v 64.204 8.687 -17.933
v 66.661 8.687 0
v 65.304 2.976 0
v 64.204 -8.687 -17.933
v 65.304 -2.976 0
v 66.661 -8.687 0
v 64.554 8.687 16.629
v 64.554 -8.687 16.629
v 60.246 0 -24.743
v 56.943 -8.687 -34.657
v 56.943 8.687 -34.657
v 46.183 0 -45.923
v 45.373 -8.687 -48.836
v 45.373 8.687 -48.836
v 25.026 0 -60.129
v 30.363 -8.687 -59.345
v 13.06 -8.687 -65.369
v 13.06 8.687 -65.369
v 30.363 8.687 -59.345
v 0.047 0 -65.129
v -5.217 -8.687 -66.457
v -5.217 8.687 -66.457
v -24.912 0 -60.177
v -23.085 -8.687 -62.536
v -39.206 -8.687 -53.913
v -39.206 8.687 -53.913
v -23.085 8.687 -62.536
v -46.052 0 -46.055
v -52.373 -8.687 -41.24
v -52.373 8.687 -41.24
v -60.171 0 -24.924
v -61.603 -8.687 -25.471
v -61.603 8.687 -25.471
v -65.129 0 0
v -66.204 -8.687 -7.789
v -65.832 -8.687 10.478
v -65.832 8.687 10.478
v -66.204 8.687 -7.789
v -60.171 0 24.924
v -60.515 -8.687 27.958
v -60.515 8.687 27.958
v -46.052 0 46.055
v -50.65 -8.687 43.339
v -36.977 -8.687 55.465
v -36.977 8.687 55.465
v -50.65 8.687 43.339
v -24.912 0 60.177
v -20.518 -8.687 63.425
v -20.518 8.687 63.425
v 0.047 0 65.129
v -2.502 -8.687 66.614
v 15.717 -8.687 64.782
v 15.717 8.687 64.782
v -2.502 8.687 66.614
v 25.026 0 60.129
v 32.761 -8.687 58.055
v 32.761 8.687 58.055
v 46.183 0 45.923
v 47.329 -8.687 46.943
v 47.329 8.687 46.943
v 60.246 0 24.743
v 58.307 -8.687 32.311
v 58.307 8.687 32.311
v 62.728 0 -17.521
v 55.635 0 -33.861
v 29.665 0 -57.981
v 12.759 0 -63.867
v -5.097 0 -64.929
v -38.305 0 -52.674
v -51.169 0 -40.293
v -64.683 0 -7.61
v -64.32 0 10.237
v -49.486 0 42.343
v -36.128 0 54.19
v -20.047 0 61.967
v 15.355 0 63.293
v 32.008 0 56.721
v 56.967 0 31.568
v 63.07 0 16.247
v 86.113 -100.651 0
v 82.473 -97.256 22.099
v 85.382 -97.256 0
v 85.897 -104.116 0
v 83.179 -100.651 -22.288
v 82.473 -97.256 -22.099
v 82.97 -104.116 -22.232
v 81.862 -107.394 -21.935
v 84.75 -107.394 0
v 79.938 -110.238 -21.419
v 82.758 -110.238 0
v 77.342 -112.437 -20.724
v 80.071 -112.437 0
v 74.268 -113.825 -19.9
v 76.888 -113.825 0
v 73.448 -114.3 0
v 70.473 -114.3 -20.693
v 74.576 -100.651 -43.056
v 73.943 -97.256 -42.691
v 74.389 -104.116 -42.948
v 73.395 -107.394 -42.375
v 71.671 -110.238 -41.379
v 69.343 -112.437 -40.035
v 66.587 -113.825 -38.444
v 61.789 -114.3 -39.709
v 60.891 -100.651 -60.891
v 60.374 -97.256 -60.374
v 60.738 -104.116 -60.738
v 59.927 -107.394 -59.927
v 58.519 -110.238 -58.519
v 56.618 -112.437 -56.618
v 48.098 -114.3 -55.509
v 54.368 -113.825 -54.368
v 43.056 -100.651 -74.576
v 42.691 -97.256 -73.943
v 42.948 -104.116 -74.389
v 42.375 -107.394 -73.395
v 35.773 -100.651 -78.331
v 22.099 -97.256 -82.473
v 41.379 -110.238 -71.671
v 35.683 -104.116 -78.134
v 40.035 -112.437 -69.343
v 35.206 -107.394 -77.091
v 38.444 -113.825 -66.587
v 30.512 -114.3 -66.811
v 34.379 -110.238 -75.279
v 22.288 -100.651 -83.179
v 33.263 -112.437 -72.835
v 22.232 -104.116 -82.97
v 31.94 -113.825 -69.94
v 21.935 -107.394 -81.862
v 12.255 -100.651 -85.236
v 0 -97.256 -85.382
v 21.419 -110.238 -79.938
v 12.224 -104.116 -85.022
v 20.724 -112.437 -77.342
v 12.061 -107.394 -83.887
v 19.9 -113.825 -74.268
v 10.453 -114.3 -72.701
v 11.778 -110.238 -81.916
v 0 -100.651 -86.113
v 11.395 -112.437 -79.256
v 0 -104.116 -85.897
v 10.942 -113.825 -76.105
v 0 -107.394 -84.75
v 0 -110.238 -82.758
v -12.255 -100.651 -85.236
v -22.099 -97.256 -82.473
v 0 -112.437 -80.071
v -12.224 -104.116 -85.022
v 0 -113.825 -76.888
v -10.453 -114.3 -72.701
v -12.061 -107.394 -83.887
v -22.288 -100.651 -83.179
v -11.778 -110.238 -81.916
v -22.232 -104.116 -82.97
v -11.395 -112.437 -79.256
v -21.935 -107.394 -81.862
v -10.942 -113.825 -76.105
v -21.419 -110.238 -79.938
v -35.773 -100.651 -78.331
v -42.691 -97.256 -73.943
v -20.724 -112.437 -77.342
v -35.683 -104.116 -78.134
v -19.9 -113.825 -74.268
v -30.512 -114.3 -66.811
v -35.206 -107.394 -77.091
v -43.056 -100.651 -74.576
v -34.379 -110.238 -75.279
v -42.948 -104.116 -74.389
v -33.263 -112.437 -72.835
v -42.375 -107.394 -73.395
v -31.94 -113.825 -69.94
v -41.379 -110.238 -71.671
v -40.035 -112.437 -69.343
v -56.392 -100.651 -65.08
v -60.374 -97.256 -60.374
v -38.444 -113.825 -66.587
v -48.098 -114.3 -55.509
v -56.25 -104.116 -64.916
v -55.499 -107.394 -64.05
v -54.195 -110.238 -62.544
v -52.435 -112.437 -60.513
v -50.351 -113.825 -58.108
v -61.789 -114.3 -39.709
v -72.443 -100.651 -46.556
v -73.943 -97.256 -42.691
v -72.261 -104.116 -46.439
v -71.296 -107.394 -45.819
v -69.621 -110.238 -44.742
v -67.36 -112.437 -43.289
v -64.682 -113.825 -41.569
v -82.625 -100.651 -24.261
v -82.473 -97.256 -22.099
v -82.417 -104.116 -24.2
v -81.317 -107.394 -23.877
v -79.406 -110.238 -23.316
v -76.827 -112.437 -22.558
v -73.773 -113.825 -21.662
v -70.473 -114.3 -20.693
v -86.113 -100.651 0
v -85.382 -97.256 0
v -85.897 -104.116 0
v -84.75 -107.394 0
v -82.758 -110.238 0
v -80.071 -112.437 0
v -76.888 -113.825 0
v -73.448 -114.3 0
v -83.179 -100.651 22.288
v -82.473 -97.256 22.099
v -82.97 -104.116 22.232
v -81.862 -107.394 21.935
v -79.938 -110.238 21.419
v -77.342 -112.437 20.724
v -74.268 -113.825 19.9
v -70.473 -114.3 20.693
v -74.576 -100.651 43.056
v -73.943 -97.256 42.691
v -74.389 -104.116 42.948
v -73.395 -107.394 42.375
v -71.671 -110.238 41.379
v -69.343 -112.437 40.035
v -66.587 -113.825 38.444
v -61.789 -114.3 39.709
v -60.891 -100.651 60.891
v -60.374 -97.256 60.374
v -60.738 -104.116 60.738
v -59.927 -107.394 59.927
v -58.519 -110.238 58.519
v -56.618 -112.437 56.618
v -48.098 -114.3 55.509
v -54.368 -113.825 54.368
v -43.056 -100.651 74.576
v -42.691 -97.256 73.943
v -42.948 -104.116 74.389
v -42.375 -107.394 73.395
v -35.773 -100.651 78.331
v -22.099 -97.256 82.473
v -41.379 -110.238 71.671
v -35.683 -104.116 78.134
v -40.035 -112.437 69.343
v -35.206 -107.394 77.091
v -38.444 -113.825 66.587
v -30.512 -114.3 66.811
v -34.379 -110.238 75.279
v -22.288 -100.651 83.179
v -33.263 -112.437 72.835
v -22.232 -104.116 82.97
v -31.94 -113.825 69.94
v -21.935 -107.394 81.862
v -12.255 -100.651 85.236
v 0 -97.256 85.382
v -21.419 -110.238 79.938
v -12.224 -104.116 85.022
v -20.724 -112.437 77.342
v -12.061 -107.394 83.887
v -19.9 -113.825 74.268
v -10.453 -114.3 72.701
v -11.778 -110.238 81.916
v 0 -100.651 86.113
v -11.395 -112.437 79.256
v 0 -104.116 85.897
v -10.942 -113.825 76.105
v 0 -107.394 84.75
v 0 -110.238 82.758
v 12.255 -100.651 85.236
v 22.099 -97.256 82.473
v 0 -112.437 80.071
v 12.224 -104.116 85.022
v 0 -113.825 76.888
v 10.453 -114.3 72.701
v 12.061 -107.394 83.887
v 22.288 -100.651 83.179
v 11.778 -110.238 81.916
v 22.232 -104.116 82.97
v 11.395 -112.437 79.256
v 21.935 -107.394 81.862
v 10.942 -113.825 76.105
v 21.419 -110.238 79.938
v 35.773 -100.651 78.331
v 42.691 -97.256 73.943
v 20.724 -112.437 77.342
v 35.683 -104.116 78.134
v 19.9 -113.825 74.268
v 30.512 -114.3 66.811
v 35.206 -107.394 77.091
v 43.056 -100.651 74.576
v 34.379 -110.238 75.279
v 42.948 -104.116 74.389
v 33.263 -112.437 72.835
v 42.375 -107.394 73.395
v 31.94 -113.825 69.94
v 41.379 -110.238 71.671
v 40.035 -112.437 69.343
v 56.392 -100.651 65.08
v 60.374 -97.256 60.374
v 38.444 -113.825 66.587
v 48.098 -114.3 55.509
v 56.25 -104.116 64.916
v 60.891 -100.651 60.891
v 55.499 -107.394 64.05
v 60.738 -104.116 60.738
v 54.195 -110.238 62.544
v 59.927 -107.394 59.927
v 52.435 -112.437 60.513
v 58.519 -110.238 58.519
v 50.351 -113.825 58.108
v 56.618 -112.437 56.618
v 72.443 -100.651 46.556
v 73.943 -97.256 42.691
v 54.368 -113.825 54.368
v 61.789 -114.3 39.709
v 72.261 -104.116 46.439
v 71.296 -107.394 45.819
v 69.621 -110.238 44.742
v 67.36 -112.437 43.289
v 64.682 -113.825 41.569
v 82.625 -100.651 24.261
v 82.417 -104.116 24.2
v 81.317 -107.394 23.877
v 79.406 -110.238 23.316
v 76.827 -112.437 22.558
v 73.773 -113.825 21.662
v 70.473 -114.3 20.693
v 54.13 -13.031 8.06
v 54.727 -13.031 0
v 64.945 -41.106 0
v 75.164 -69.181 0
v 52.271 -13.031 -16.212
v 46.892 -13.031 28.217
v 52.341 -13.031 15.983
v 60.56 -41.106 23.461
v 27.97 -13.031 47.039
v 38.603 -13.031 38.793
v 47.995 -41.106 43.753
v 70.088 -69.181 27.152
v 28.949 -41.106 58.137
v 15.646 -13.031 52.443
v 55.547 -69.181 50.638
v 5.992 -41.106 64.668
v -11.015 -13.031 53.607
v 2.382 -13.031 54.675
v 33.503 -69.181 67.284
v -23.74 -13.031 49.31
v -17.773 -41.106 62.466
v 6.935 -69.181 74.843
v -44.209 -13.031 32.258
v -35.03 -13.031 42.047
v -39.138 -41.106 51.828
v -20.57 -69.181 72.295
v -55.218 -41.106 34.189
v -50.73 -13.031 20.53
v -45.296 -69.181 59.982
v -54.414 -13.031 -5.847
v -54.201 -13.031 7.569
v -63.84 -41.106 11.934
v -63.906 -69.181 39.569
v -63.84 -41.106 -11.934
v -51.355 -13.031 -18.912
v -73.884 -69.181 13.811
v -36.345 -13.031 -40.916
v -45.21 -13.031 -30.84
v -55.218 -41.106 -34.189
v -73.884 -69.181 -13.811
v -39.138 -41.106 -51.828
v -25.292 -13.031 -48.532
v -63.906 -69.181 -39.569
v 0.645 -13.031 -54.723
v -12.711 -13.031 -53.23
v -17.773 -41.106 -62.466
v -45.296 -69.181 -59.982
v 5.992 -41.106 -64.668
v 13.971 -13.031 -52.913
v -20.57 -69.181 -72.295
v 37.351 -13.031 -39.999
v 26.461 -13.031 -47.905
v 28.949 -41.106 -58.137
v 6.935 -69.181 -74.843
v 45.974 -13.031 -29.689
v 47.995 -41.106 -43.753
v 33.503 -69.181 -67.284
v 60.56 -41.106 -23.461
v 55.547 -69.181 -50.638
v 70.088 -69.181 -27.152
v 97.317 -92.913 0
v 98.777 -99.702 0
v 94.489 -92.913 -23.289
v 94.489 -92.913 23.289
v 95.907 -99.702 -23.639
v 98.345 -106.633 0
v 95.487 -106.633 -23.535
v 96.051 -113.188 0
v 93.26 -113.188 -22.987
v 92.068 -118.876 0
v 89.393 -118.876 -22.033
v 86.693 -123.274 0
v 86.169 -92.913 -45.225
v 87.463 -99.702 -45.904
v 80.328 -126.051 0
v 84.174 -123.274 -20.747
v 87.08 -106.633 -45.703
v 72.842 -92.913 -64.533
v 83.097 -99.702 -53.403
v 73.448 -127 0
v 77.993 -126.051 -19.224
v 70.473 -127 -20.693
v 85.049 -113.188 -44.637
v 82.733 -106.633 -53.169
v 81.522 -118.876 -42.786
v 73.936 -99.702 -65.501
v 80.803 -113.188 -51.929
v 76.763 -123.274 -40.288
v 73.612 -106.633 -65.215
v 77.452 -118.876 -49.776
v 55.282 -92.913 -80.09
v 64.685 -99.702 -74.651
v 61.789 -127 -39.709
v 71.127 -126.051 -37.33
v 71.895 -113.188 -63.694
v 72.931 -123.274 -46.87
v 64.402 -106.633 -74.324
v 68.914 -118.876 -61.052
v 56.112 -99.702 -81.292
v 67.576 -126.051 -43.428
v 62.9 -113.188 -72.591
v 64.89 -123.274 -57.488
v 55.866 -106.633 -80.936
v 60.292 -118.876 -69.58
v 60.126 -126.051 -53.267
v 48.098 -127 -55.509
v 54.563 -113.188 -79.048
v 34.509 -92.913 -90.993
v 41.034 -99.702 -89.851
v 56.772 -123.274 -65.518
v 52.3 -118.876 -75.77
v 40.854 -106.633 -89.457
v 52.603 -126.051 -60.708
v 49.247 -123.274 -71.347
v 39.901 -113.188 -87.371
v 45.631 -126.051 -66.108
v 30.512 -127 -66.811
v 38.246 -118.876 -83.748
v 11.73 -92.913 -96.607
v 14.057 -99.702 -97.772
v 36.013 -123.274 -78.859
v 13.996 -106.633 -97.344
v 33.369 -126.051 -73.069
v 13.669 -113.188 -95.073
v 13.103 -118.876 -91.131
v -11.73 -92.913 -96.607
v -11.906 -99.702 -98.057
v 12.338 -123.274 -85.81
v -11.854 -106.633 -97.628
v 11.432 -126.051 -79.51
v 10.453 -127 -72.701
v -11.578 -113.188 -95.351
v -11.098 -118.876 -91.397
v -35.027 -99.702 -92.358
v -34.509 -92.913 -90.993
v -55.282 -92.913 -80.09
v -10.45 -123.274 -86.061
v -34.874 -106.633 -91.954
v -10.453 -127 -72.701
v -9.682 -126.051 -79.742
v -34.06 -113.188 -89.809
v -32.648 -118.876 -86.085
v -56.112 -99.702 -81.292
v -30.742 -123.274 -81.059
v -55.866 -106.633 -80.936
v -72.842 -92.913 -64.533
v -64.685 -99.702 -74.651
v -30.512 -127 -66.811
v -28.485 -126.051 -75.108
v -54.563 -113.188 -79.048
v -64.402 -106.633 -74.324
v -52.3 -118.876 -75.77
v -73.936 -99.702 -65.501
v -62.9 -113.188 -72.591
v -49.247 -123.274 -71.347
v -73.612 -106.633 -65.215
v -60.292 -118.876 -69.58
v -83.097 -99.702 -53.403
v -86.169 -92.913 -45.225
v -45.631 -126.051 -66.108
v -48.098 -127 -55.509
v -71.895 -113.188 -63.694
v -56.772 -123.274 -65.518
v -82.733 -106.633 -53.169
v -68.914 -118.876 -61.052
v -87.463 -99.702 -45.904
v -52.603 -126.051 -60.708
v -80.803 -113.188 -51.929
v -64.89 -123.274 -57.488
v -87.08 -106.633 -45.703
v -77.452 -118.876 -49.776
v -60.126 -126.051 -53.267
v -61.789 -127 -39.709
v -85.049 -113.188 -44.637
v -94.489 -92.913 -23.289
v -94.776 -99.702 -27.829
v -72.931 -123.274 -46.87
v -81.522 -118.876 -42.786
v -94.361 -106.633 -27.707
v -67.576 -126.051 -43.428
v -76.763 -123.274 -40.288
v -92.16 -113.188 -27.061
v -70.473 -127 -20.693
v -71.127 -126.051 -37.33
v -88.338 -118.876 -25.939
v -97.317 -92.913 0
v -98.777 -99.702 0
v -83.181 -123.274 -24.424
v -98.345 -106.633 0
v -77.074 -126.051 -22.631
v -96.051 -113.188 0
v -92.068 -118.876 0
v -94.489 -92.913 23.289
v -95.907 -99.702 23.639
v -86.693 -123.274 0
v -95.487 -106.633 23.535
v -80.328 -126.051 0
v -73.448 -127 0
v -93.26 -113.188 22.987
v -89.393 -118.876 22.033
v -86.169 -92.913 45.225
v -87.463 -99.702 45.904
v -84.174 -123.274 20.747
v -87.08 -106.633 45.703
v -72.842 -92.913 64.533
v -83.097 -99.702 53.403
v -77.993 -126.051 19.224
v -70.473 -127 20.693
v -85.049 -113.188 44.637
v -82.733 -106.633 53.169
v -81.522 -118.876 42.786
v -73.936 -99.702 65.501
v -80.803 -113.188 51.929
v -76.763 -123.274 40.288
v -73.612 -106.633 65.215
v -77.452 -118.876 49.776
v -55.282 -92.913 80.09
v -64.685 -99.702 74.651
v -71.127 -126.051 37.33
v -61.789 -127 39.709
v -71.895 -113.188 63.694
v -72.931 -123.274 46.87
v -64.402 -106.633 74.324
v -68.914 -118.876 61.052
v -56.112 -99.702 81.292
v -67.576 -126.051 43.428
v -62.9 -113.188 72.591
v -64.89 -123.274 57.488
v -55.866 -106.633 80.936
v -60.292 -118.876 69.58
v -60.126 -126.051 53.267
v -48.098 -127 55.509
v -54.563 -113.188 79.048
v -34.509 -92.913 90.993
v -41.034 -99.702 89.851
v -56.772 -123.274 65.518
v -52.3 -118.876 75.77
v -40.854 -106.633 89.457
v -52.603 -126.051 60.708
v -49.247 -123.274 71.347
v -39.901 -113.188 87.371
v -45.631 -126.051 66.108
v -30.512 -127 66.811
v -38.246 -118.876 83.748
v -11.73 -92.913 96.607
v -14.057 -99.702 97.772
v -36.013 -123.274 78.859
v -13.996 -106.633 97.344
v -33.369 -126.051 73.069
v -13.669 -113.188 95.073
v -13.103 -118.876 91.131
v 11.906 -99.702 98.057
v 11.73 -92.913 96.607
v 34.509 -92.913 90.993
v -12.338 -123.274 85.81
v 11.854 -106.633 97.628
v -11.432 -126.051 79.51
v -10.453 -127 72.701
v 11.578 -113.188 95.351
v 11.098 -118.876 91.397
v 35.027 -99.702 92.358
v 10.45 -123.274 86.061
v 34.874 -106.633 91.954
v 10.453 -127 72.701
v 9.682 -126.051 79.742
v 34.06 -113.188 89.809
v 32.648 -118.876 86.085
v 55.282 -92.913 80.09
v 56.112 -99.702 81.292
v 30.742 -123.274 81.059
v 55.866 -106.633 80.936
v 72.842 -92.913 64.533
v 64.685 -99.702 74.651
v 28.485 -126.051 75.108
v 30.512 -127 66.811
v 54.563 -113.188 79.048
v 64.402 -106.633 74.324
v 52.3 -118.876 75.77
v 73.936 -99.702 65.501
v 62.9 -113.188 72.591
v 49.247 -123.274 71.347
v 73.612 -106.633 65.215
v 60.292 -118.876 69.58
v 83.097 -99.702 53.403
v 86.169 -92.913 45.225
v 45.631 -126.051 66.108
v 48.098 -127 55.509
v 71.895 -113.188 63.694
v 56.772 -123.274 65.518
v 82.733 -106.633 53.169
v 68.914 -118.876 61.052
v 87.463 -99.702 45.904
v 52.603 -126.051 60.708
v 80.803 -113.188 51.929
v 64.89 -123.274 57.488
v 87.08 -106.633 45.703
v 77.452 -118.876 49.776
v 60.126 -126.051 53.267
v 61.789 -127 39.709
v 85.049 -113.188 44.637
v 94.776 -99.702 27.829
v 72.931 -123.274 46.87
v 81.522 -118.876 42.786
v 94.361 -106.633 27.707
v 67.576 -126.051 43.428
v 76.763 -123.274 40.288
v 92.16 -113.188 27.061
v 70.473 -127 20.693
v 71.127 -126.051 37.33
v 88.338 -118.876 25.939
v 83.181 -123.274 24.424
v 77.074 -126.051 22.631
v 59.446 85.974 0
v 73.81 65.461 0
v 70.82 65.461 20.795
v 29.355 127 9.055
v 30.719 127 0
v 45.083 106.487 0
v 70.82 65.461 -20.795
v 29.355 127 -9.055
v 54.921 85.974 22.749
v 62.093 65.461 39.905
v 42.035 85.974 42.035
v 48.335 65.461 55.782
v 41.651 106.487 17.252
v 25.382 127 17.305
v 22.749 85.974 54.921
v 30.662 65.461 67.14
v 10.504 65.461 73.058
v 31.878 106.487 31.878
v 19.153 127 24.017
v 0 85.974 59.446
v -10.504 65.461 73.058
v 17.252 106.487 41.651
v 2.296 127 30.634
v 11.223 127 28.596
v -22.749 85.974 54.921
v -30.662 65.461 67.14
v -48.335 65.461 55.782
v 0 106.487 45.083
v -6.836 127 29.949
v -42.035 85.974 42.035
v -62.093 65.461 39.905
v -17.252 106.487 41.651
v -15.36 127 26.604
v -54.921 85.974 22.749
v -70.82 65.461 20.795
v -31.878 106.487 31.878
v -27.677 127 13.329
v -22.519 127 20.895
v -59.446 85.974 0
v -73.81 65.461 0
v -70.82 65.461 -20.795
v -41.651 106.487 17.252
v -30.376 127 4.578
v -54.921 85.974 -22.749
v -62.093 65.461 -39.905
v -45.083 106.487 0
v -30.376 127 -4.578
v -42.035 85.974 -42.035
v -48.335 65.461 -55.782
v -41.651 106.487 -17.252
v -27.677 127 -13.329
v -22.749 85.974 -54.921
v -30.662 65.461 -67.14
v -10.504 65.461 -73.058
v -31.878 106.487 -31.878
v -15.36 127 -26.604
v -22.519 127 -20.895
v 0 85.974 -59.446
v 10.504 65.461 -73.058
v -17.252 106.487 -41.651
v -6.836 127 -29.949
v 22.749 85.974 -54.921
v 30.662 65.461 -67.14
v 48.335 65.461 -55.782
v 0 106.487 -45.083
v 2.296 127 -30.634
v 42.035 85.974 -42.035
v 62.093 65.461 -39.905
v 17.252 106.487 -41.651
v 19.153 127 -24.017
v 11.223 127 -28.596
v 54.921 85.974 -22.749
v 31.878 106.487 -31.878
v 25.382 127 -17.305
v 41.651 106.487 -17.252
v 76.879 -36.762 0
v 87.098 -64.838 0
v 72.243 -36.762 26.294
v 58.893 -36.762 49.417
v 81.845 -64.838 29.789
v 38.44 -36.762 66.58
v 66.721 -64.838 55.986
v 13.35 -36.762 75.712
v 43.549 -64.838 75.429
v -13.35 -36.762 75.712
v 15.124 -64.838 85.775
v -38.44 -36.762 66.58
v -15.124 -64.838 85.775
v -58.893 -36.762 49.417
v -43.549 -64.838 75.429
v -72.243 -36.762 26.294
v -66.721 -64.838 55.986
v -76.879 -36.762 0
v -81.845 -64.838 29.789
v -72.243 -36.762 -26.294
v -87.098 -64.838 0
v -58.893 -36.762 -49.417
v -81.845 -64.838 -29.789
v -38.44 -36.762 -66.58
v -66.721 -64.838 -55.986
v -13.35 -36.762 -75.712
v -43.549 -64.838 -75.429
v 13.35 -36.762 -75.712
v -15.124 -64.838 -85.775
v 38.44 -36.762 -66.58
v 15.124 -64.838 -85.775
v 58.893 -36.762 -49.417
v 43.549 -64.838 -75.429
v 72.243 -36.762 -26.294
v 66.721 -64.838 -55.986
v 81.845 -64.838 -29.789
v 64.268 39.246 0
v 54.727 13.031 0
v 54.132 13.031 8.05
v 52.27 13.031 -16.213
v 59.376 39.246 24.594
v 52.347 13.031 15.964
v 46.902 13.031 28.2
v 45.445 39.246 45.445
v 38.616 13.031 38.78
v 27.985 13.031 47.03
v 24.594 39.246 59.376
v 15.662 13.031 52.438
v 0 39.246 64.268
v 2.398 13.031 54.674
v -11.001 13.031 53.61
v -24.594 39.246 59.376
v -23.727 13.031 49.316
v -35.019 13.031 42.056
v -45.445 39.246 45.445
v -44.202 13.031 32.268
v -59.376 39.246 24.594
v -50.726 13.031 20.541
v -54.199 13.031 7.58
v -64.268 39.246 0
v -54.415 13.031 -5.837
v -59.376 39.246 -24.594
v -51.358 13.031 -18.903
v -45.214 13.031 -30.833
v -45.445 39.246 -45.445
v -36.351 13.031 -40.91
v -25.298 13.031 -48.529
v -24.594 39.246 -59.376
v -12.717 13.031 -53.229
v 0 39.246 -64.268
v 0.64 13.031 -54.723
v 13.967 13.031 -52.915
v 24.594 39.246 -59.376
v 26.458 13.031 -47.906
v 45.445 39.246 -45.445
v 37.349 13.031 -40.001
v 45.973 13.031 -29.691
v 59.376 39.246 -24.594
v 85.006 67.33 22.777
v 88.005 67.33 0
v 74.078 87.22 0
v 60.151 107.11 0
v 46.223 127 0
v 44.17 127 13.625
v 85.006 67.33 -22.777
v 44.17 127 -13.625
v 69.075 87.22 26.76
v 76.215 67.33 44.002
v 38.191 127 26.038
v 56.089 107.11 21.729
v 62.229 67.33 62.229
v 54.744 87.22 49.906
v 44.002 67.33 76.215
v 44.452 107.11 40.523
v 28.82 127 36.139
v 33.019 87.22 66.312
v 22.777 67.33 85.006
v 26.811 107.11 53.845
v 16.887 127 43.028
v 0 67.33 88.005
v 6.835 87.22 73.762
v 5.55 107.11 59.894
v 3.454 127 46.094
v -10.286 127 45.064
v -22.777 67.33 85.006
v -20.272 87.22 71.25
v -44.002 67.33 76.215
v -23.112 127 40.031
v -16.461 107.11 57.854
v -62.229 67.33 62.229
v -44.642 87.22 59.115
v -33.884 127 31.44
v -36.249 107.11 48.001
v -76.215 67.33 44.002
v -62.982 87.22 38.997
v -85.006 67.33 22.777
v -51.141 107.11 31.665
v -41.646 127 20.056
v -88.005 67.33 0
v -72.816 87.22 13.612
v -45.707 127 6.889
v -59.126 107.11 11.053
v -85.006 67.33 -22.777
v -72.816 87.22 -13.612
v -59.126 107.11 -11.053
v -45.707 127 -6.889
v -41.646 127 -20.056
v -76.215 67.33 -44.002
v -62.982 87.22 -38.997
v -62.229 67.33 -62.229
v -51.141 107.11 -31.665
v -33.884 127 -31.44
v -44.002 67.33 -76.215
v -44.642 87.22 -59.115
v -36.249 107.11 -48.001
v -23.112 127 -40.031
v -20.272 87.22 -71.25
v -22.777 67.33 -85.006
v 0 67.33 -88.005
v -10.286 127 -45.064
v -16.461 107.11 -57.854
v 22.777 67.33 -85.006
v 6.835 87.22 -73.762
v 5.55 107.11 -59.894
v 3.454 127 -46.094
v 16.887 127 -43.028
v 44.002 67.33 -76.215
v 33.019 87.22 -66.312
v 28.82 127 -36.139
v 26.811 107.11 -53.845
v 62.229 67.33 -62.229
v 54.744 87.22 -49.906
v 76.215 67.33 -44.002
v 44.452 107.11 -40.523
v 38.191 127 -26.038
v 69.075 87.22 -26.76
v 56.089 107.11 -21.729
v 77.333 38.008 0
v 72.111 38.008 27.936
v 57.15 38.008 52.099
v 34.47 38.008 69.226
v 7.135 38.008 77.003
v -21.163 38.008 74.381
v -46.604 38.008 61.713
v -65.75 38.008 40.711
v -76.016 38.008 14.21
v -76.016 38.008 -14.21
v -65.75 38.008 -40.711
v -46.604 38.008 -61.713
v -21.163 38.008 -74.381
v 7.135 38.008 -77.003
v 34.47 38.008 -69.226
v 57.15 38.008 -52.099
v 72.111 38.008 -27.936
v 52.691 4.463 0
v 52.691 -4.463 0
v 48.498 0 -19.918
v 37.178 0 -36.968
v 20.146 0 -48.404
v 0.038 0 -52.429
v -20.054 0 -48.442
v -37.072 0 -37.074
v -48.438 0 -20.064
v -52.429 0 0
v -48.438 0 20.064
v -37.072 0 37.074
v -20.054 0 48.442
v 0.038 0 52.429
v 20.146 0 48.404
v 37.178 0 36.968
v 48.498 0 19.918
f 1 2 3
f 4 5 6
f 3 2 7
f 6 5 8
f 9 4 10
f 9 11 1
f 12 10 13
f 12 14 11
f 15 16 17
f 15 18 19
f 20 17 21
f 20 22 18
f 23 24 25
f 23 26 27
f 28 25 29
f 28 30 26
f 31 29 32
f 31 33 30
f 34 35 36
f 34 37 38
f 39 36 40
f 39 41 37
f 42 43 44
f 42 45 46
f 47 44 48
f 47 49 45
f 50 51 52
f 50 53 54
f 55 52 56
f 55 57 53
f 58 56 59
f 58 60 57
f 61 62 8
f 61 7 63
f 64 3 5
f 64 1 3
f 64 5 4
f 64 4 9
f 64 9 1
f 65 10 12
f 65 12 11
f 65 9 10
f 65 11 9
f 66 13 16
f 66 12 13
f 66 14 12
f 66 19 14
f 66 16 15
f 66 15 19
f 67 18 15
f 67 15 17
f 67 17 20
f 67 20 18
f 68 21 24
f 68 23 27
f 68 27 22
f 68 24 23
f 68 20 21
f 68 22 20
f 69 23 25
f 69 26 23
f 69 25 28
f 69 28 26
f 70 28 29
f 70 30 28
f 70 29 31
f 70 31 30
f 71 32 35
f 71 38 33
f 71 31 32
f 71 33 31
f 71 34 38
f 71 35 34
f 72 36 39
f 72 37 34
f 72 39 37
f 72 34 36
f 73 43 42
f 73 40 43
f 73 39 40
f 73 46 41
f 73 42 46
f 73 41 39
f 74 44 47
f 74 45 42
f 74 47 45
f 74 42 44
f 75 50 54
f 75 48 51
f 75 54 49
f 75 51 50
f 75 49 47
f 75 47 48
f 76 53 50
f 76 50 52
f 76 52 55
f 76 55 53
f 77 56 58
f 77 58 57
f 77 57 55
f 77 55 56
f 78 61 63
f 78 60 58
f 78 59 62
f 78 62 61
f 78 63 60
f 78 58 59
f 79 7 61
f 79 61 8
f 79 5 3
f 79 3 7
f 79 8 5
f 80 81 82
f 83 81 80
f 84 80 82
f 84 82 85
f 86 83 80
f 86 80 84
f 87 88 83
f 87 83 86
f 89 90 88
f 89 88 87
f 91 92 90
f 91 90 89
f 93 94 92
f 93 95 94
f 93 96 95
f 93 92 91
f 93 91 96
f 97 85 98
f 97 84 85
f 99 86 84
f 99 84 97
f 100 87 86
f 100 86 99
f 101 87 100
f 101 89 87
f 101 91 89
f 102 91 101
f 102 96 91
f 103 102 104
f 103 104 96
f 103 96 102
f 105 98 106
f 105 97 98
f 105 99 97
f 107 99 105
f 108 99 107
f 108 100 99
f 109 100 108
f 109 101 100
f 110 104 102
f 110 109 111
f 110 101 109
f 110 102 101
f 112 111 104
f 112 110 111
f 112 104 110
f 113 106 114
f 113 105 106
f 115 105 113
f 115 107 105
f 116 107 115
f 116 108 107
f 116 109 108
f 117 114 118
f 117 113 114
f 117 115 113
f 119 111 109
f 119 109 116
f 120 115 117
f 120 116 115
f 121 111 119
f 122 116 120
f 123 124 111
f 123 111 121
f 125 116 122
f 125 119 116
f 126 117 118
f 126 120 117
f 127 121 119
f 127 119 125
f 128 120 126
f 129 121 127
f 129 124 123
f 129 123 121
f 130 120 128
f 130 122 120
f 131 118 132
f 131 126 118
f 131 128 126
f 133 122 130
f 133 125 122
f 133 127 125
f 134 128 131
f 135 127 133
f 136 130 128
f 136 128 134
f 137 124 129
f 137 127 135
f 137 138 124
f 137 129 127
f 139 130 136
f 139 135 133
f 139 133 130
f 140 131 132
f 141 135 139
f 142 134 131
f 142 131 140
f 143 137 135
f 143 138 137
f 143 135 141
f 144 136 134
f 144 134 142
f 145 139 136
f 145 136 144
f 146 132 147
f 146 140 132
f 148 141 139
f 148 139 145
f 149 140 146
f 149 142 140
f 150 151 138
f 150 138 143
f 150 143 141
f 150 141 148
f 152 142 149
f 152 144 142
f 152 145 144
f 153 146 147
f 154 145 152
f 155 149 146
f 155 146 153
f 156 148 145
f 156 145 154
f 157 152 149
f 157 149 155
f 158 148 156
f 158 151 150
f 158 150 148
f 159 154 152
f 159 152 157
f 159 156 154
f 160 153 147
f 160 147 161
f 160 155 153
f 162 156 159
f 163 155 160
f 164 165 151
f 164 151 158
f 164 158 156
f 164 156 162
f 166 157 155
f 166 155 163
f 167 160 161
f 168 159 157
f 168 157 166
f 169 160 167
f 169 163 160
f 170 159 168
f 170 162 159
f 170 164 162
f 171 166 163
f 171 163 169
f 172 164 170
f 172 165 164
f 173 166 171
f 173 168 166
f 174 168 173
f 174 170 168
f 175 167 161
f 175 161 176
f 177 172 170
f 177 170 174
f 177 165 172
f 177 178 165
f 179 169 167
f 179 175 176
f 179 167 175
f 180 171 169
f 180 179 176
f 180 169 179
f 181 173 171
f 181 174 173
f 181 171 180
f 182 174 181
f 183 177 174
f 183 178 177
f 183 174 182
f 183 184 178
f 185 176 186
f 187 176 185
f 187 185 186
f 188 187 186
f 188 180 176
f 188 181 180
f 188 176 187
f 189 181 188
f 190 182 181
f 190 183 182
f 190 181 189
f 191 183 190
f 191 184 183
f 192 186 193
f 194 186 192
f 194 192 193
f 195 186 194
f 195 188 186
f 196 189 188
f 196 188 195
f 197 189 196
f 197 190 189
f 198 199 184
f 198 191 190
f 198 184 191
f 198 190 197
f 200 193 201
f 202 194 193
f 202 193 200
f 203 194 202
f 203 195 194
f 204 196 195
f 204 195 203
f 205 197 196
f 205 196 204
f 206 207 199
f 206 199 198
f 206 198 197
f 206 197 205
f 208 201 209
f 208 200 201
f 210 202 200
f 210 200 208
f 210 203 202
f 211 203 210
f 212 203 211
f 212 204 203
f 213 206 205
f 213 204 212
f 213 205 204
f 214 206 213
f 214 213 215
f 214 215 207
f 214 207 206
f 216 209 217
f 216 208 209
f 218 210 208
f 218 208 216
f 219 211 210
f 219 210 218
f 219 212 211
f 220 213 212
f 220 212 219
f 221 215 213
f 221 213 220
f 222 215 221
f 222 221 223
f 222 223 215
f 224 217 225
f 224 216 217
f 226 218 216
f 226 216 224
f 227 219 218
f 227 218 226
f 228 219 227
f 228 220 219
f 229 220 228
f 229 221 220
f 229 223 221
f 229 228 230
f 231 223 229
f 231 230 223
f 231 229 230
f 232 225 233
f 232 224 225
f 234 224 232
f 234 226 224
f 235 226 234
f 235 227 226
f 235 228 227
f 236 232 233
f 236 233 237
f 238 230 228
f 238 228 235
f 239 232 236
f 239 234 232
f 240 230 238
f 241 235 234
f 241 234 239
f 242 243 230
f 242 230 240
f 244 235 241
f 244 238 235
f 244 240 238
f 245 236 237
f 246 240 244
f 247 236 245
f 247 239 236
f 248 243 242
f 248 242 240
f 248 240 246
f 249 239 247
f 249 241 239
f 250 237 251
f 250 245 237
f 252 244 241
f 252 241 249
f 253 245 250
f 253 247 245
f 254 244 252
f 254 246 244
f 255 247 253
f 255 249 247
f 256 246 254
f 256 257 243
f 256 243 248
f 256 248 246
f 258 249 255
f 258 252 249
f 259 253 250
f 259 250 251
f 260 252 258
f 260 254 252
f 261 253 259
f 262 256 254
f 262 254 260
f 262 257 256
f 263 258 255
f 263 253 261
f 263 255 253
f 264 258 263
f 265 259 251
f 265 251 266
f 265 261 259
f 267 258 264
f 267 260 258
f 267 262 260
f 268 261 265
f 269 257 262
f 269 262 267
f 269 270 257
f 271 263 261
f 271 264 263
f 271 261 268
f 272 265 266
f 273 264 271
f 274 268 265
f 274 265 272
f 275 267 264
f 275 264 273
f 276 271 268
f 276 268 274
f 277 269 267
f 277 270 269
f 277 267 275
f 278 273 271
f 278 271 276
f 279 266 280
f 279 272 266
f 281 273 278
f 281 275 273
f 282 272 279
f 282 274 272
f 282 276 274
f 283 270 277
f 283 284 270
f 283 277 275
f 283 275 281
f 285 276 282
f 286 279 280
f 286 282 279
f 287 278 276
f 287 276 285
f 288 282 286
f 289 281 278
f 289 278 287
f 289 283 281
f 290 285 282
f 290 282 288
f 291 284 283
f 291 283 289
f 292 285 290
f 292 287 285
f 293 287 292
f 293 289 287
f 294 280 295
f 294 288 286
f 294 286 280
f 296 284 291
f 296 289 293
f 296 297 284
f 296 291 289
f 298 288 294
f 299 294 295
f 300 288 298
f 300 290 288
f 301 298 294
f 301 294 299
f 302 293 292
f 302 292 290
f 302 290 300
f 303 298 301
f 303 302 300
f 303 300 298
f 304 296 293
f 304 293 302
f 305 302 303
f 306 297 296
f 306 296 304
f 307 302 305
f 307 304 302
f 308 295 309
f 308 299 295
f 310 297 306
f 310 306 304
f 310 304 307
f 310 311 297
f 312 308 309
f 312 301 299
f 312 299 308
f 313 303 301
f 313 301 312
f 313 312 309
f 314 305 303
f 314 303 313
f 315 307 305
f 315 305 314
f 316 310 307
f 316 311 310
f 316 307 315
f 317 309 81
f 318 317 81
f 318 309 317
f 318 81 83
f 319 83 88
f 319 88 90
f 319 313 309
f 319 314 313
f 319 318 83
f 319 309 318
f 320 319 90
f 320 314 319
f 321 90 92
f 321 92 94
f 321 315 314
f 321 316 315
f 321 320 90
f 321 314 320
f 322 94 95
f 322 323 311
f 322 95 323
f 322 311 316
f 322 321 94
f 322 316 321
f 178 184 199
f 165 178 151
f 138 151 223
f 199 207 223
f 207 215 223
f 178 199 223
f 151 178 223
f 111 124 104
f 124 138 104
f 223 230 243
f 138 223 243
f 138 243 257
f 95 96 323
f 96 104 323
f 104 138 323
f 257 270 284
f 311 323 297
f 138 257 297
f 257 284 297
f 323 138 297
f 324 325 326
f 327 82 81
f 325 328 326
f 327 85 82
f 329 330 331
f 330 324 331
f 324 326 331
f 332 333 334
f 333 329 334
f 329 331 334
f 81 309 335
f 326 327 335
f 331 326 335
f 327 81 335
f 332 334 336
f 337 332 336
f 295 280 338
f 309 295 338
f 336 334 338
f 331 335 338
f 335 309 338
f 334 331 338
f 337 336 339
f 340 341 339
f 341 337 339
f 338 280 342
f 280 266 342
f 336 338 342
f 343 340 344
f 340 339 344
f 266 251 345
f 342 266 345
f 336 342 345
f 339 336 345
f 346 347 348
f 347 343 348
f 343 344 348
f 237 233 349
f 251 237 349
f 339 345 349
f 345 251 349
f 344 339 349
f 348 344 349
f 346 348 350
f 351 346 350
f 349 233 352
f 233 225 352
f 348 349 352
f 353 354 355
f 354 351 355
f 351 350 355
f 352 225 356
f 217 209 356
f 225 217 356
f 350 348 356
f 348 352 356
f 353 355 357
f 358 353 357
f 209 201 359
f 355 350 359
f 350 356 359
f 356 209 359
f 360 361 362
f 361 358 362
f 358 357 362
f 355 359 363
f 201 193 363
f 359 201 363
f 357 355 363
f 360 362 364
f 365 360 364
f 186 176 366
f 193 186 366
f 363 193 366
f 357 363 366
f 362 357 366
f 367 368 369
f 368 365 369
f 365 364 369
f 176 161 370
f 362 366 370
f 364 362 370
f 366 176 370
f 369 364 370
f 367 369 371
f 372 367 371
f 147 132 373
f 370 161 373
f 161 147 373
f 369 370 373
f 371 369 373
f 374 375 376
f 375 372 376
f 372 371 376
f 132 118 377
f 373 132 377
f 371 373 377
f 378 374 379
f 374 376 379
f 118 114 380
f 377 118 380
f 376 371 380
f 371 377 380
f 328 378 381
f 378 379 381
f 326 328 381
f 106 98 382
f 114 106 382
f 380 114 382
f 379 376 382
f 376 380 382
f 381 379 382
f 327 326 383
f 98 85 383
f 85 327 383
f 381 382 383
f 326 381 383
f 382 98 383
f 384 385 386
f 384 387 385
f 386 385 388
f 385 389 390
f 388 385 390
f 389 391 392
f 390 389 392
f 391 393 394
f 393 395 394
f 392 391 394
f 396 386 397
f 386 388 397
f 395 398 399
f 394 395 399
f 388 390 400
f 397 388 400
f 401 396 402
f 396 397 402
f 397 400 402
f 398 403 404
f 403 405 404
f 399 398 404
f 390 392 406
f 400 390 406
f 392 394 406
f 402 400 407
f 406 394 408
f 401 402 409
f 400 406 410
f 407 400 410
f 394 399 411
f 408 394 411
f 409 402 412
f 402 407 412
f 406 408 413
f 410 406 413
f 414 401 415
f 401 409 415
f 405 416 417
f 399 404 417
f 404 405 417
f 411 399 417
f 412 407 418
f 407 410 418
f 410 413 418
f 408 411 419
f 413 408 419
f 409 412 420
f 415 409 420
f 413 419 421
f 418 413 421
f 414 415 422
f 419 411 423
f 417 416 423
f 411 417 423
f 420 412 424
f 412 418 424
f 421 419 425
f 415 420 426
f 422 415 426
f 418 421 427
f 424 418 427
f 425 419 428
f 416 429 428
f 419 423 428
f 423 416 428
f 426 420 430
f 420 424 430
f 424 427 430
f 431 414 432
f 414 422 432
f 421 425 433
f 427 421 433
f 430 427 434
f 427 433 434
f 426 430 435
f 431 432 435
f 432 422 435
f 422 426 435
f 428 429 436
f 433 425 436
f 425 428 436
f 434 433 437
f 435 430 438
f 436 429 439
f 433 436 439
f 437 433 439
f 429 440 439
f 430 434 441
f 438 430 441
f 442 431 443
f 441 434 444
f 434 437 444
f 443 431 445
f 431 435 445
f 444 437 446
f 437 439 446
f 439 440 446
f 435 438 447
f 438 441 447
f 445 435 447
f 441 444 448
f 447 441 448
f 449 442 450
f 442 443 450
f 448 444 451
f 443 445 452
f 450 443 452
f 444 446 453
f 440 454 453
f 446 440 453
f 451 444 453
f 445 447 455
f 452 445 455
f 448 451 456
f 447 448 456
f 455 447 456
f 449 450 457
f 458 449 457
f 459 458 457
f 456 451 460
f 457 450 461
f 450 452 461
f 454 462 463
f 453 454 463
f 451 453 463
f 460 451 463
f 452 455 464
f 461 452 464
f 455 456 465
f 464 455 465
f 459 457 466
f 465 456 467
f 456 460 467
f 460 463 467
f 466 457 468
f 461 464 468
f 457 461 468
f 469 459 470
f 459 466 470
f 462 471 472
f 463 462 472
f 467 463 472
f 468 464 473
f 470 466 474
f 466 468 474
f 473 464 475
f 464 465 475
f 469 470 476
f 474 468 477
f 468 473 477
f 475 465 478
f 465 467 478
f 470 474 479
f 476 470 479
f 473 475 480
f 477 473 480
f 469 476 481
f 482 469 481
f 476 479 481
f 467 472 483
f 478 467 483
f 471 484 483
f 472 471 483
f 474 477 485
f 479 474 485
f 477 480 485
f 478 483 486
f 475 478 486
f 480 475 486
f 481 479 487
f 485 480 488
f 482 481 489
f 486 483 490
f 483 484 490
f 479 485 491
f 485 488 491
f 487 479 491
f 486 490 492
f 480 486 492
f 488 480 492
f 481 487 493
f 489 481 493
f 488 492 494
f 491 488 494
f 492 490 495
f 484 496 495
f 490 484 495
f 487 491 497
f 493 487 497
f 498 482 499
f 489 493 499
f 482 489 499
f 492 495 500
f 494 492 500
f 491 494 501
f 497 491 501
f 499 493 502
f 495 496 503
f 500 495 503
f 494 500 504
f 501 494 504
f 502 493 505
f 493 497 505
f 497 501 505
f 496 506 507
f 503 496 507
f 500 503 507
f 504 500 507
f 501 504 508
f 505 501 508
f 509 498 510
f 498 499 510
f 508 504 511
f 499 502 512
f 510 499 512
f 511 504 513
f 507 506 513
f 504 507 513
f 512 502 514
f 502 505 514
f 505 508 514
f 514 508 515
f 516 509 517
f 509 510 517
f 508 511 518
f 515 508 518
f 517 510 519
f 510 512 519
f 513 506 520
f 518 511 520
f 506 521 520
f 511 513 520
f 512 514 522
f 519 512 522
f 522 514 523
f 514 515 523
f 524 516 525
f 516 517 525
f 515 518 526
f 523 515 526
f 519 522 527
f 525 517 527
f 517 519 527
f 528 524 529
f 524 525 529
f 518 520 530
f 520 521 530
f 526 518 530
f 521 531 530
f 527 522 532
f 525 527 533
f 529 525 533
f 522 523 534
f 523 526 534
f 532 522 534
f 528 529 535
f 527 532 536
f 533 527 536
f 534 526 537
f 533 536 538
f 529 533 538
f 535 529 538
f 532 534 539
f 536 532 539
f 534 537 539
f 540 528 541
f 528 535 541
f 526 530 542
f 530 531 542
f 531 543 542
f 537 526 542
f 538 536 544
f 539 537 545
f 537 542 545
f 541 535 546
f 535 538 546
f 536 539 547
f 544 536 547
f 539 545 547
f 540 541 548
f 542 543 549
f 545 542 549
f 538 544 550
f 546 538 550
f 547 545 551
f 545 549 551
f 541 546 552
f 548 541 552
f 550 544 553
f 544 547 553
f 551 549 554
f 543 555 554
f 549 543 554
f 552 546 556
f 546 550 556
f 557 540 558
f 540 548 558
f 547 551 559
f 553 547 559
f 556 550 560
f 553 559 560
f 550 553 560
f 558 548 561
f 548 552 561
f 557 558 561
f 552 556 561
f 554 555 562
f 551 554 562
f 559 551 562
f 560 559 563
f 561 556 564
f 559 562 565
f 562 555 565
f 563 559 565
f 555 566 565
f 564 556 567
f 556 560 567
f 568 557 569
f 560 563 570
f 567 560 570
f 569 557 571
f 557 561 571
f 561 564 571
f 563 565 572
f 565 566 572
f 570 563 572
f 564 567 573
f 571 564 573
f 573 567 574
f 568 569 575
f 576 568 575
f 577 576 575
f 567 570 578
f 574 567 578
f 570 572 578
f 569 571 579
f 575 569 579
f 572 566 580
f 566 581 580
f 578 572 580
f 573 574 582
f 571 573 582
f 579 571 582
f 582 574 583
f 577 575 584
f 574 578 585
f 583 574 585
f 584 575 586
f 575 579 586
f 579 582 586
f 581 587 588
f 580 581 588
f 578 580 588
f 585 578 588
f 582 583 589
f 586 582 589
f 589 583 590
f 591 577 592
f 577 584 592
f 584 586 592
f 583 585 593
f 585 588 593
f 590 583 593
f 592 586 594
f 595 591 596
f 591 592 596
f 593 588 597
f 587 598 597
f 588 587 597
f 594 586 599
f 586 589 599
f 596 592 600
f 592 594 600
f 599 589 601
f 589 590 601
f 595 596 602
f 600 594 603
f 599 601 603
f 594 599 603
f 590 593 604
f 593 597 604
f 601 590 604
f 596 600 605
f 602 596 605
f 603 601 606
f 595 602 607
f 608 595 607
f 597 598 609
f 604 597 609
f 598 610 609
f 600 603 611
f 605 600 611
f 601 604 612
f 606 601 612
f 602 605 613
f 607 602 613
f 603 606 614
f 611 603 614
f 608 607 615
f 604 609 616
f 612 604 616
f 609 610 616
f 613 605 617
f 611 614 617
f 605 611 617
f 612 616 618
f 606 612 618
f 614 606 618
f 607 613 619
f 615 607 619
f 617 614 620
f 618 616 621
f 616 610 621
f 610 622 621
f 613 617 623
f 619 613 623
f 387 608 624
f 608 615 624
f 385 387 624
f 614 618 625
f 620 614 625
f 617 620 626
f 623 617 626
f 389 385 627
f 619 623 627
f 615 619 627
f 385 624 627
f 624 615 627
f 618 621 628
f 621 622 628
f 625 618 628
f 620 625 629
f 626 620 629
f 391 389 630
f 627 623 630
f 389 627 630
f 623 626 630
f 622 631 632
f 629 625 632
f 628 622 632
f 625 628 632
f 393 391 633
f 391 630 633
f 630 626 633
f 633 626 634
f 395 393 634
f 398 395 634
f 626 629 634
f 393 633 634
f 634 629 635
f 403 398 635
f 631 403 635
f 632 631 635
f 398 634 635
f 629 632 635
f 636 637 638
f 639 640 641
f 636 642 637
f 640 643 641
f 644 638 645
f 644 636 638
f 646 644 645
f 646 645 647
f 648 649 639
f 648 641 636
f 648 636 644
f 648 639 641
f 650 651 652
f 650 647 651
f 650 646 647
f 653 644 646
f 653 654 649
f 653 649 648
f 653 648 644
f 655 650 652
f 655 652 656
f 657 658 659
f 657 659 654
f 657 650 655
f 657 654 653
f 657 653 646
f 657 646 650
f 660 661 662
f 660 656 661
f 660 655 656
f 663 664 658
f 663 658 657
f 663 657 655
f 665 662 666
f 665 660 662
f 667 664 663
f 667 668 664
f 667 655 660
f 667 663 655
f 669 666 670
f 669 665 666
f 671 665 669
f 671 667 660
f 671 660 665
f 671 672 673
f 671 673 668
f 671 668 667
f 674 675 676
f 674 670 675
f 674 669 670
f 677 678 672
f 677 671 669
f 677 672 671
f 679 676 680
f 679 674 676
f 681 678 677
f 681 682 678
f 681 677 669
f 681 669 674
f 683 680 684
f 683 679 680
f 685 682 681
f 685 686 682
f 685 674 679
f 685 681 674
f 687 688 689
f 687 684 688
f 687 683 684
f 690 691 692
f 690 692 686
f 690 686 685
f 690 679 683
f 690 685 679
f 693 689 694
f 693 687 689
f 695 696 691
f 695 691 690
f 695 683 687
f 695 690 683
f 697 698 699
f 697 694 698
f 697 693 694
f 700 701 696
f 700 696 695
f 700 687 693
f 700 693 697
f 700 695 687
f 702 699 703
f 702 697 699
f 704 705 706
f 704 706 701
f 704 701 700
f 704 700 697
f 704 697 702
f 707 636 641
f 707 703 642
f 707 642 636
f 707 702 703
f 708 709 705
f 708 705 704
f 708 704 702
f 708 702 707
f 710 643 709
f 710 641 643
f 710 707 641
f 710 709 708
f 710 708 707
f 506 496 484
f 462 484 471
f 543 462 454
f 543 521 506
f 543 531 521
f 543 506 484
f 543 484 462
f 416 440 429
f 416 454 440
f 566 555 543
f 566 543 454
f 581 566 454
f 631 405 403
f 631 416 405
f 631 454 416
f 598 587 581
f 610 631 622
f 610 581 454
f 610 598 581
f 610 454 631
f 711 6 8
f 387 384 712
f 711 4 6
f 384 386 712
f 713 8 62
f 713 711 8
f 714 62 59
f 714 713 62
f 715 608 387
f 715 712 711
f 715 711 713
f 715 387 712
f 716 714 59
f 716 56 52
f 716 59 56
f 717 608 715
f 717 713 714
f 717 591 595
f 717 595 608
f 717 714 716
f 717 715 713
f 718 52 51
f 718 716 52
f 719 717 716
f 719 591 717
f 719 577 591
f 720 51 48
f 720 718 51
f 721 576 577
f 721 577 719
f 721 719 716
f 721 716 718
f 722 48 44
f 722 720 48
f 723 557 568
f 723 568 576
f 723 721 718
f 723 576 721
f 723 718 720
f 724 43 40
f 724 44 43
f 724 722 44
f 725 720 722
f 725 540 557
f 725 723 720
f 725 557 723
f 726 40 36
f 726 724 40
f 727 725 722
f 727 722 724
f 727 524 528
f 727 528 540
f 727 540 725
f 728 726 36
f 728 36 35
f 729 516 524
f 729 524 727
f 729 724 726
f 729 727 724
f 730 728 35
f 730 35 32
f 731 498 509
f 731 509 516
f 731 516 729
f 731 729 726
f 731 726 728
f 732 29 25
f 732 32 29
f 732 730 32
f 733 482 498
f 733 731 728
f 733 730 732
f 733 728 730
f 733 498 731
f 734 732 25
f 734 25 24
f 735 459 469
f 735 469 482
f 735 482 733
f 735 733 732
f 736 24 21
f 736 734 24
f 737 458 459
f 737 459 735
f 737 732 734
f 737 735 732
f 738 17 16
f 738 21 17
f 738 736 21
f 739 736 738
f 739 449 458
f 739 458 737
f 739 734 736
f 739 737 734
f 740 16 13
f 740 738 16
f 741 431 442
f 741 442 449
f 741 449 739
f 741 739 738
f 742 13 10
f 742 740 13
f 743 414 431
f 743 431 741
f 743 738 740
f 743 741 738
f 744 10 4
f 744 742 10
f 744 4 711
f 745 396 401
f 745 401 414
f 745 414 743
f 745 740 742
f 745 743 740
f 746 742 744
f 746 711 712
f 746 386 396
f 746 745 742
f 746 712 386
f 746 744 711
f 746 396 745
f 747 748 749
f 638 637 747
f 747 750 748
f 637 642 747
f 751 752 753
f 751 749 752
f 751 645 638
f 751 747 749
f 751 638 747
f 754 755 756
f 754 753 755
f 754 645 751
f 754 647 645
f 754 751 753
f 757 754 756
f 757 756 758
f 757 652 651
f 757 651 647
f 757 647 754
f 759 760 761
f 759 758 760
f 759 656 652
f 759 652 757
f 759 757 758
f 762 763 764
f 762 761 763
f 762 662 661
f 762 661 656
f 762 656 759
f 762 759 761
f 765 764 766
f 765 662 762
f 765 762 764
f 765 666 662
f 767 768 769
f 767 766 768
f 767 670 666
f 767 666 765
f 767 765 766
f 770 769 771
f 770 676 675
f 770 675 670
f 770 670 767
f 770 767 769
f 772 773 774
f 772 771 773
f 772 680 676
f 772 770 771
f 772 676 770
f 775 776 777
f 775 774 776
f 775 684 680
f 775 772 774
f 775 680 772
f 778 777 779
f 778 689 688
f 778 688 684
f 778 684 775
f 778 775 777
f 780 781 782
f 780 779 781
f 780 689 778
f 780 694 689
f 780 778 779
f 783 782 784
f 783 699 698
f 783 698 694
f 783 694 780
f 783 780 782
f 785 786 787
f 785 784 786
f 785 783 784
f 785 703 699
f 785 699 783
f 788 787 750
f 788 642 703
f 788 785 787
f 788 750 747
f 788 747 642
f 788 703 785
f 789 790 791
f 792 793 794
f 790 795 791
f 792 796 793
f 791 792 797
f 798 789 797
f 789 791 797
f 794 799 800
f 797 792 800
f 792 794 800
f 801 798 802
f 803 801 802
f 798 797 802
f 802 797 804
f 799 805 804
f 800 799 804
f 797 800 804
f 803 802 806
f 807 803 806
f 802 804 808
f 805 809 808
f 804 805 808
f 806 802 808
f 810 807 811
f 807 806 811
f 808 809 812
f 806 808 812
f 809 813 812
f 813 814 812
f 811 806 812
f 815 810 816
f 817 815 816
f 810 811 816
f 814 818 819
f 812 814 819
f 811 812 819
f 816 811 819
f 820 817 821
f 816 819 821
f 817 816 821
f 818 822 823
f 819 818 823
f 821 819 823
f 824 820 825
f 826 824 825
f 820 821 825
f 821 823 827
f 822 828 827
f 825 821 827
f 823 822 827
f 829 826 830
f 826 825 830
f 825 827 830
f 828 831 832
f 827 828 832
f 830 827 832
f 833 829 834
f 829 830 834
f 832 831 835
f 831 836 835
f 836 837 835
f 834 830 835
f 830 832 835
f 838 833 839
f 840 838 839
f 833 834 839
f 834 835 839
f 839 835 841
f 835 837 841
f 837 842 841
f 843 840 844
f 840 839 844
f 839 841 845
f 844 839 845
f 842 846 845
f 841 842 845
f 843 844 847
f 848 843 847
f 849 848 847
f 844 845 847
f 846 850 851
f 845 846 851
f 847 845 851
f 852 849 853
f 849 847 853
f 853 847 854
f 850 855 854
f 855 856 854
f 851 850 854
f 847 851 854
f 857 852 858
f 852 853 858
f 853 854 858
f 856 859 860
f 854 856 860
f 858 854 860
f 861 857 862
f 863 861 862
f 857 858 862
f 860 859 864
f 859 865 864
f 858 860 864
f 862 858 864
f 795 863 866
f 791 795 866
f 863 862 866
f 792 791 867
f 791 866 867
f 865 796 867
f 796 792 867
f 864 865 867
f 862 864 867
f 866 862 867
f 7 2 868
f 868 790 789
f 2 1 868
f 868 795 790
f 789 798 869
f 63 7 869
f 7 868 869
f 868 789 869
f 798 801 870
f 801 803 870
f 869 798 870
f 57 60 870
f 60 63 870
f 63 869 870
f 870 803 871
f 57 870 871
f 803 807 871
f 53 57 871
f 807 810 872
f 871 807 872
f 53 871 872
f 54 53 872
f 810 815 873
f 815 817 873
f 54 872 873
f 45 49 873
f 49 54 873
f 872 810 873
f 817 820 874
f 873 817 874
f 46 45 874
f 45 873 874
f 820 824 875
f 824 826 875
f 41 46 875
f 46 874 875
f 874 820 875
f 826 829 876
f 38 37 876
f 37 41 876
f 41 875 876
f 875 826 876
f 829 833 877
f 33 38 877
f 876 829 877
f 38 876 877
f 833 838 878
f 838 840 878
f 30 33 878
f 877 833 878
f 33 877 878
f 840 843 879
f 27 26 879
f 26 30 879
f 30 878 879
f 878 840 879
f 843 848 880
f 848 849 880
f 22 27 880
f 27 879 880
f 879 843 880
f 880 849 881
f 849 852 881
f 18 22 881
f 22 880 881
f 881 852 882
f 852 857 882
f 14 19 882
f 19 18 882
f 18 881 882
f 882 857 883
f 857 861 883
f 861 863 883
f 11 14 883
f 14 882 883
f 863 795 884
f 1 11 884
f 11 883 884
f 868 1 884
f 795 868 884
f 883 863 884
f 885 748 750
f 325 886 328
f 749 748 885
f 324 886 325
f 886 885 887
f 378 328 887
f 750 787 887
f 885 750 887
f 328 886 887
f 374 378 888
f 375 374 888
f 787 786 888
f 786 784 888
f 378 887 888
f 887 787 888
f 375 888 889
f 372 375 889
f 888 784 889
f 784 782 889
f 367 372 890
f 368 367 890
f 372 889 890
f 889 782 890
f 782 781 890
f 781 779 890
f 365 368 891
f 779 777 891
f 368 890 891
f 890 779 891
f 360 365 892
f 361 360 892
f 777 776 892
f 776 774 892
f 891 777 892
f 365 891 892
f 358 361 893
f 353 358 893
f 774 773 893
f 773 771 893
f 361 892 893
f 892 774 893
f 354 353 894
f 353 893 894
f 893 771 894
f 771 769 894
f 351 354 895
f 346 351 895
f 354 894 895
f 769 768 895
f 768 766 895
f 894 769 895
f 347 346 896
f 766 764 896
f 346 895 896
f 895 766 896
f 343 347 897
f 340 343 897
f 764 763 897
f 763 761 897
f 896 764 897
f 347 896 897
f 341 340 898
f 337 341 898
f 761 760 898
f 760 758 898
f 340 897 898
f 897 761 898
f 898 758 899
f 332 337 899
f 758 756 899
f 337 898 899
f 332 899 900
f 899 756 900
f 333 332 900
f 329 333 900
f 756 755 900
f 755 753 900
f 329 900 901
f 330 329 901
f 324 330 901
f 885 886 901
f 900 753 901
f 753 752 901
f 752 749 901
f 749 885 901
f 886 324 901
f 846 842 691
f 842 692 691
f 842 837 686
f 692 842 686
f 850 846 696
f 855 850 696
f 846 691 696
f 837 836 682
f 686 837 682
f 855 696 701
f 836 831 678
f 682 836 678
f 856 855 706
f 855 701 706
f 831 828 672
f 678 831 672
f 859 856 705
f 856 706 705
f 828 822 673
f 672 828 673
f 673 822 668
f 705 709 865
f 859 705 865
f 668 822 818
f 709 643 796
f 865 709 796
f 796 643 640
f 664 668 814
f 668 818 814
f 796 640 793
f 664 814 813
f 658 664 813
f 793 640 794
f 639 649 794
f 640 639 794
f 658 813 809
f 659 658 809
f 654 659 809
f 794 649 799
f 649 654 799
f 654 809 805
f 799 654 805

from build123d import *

# Parameters (mm, degrees)
F0_R     = 63.4990501998
F1_DEPTH = 127
F1_TAPER = -20
F2_R     = 25.4
F3_SIZE  = 63.5
F5_T     = -12.7


# Not quite as in the source:
# - a feature of the source that left no trace in its solid (it failed there, or was rolled back) is left out


with BuildPart() as f1:
    # F0 (on Front) → F1 (new body, symmetric)
    with BuildSketch(Plane.XZ):
        Circle(F0_R)
    extrude(amount=F1_DEPTH, both=True, taper=F1_TAPER)

    # F2
    f2_edges = [f1.edges().sort_by_distance(p)[0] for p in [
        (-63.49905, 0, 0),
        (-109.72327, -127, 0),
    ]]
    fillet(f2_edges, radius=F2_R)

    # F3
    f3_edges = [f1.edges().sort_by_distance(p)[0] for p in [
        (-109.72327, 127, 0),
    ]]
    chamfer(f3_edges, length=F3_SIZE)

    # F5
    f5_openings = [f1.faces().sort_by_distance(p)[0] for p in [
        (0, 127, 0),
    ]]
    offset(amount=F5_T, openings=f5_openings)


solid = f1.part
